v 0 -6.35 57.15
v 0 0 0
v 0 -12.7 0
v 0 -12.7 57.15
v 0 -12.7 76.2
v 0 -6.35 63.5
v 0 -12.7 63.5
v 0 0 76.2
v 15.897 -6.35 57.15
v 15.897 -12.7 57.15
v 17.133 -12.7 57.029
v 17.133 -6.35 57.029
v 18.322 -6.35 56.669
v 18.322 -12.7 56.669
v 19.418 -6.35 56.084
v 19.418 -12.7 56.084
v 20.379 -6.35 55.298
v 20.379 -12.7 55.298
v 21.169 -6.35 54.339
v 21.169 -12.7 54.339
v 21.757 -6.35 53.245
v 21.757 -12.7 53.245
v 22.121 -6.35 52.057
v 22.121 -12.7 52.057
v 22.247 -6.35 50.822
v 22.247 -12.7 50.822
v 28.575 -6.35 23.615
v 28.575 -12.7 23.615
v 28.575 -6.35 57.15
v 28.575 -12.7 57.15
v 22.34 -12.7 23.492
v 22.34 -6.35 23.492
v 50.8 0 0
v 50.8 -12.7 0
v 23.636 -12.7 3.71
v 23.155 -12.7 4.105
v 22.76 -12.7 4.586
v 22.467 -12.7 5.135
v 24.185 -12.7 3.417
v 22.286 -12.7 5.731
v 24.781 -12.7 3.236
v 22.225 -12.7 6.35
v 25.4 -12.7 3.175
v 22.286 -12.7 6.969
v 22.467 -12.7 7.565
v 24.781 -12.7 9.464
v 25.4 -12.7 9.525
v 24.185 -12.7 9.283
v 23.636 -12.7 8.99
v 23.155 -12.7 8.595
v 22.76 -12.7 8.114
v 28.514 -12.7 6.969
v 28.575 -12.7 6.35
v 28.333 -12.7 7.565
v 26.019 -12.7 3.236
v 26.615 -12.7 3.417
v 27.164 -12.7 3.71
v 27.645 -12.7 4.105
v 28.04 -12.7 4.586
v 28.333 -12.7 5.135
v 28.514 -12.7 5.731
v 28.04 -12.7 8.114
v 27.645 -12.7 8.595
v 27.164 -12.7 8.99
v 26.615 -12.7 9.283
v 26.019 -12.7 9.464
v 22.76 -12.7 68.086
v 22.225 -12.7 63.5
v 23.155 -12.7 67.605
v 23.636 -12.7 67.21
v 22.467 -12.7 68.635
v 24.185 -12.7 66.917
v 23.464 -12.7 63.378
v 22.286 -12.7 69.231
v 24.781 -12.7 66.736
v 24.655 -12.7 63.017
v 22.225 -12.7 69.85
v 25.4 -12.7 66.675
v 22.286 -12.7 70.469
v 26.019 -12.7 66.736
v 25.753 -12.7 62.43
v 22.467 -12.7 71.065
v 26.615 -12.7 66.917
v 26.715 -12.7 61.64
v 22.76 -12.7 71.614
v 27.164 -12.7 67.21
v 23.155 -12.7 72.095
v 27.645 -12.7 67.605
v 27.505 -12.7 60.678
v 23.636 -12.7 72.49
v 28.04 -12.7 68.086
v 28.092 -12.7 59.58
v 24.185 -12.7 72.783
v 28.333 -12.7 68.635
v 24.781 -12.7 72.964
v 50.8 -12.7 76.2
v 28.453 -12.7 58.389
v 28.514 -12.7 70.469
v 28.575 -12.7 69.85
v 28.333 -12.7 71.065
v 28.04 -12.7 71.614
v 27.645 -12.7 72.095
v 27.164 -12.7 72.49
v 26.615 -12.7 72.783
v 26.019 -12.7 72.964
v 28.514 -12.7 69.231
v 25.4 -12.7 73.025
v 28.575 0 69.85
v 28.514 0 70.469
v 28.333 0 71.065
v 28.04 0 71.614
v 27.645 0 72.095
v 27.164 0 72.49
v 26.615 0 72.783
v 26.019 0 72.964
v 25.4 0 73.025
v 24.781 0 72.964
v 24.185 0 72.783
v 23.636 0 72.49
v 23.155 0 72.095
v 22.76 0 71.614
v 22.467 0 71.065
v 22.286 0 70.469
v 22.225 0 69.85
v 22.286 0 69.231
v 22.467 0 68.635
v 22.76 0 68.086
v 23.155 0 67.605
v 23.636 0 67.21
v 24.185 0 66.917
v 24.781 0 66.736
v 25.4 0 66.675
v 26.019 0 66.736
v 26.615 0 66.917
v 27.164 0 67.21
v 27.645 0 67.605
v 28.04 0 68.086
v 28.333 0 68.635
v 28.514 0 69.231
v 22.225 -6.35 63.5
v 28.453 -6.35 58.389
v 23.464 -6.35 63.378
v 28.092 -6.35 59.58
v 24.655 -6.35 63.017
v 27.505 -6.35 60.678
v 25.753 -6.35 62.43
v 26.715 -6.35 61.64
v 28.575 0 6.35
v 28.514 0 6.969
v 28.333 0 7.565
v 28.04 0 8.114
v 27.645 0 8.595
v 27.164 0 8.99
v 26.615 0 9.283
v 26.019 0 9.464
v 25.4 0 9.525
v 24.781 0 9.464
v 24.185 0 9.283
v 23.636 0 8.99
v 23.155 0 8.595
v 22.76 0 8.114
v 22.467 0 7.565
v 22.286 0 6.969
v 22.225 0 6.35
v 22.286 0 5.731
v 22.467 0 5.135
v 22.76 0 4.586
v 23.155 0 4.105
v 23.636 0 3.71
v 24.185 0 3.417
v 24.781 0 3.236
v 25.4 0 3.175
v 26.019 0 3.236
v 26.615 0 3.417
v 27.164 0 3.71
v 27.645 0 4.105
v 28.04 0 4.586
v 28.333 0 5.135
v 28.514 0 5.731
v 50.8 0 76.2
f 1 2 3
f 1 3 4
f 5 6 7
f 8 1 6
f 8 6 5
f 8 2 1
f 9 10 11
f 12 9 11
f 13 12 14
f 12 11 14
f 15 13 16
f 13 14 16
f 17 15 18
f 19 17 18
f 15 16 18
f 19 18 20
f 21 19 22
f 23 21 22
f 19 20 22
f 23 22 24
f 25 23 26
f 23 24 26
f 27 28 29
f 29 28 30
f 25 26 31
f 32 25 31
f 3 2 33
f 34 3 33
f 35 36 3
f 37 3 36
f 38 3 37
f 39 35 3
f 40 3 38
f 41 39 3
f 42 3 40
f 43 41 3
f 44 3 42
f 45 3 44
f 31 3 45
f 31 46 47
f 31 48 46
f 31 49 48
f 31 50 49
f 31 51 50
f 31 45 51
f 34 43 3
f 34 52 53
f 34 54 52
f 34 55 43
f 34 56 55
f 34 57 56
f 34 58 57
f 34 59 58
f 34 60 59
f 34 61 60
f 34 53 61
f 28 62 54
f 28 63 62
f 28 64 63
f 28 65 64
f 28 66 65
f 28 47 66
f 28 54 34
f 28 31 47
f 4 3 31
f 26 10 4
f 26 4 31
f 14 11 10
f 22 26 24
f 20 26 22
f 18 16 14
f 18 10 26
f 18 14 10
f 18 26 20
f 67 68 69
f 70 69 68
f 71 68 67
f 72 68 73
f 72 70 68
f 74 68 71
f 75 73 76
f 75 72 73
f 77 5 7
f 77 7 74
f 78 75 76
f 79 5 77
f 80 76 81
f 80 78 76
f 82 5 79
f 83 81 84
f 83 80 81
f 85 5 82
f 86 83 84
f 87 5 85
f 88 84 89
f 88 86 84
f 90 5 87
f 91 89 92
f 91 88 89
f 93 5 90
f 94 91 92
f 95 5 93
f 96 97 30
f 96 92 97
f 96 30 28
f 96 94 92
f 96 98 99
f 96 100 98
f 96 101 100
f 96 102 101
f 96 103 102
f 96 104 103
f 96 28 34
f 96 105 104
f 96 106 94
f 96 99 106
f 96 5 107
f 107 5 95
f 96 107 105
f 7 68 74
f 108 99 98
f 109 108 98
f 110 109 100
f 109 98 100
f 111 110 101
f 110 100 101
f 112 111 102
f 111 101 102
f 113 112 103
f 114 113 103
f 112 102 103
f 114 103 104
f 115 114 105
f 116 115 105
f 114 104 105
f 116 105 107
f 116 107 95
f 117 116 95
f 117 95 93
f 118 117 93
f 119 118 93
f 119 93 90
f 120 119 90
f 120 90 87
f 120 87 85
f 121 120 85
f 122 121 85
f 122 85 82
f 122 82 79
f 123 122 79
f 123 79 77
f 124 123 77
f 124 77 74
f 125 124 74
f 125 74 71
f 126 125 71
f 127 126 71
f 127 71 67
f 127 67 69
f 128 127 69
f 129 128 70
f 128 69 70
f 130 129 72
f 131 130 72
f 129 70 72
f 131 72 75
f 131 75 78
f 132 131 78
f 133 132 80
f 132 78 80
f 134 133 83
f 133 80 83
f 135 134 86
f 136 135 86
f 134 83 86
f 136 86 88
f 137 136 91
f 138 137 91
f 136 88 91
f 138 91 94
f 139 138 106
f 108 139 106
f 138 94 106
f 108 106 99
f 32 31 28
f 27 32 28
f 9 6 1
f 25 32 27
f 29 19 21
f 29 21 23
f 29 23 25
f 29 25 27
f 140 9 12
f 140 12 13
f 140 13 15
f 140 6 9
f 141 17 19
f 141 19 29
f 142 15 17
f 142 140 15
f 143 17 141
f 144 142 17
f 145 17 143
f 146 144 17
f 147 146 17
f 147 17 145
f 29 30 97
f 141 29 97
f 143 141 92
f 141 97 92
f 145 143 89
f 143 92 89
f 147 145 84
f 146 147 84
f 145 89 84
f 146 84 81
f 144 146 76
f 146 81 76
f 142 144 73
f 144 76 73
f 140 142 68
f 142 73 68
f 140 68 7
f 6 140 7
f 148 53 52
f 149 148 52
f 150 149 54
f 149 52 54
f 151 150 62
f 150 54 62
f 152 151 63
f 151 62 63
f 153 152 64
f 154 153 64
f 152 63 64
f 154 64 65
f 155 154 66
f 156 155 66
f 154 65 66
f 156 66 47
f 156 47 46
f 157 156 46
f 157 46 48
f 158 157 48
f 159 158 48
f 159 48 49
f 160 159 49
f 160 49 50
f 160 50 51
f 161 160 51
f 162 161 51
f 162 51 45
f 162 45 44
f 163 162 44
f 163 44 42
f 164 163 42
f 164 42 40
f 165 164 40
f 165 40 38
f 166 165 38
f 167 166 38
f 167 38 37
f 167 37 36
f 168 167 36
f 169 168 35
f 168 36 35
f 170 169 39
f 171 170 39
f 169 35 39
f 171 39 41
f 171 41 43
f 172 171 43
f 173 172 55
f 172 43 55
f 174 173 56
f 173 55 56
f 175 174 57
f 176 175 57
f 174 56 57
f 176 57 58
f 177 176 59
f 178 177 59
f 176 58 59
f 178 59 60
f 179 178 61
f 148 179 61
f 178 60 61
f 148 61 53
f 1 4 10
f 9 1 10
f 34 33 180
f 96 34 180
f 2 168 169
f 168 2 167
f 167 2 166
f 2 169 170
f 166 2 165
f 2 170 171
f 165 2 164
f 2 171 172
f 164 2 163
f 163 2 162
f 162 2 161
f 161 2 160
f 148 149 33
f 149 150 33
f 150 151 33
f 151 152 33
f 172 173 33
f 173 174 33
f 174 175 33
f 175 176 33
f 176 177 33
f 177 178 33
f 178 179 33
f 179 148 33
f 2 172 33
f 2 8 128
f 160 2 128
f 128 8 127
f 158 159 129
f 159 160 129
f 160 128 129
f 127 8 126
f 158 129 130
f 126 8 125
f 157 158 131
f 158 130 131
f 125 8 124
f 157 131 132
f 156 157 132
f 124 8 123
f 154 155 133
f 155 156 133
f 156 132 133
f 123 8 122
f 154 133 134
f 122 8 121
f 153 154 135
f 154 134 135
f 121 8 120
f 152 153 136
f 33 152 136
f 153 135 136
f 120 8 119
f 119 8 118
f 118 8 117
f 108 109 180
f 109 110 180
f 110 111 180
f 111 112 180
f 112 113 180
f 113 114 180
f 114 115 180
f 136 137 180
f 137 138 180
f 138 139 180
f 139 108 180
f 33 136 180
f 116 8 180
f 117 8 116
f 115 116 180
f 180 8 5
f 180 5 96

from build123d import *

# Parameters (mm, degrees)
F0_W     = 50.8
F0_H     = 76.2
F1_DEPTH = 12.7
F3_DEPTH = 6.35
F4_R     = 3.175
F5_DEPTH = 12.701


with BuildPart() as f1:
    # F0 (on Front) → F1 (new body)
    with BuildSketch(Plane.XZ):
        with Locations((25.4, 38.1)):
            Rectangle(F0_W, F0_H)
    extrude(amount=F1_DEPTH)

    # F2 (on face) → F3 (cut)
    with BuildSketch(Plane.XZ.offset(12.7)):
        with BuildLine():
            Line((22.225, 63.5), (0, 63.5))
            Line((0, 63.5), (0, 57.15))
            Line((0, 57.15), (15.896593, 57.15))
            ThreePointArc((15.896593, 57.15), (20.379061, 55.297775), (22.246556, 50.821648))
            Line((22.246556, 50.821648), (22.339729, 23.491532))
            Line((22.339729, 23.491532), (28.575, 23.61499))
            Line((28.575, 23.61499), (28.575, 57.15))
            ThreePointArc((28.575, 57.15), (26.715128, 61.640128), (22.225, 63.5))
        make_face()
    extrude(amount=-F3_DEPTH, mode=Mode.SUBTRACT)

    # F4 (on face) → F5 (cut, through all)
    with BuildSketch(Plane.XZ.offset(12.7)):
        with Locations((25.4, 69.85)):
            Circle(F4_R)
        with Locations((25.4, 6.35)):
            Circle(F4_R)
    extrude(amount=-F5_DEPTH, mode=Mode.SUBTRACT)


solid = f1.part
